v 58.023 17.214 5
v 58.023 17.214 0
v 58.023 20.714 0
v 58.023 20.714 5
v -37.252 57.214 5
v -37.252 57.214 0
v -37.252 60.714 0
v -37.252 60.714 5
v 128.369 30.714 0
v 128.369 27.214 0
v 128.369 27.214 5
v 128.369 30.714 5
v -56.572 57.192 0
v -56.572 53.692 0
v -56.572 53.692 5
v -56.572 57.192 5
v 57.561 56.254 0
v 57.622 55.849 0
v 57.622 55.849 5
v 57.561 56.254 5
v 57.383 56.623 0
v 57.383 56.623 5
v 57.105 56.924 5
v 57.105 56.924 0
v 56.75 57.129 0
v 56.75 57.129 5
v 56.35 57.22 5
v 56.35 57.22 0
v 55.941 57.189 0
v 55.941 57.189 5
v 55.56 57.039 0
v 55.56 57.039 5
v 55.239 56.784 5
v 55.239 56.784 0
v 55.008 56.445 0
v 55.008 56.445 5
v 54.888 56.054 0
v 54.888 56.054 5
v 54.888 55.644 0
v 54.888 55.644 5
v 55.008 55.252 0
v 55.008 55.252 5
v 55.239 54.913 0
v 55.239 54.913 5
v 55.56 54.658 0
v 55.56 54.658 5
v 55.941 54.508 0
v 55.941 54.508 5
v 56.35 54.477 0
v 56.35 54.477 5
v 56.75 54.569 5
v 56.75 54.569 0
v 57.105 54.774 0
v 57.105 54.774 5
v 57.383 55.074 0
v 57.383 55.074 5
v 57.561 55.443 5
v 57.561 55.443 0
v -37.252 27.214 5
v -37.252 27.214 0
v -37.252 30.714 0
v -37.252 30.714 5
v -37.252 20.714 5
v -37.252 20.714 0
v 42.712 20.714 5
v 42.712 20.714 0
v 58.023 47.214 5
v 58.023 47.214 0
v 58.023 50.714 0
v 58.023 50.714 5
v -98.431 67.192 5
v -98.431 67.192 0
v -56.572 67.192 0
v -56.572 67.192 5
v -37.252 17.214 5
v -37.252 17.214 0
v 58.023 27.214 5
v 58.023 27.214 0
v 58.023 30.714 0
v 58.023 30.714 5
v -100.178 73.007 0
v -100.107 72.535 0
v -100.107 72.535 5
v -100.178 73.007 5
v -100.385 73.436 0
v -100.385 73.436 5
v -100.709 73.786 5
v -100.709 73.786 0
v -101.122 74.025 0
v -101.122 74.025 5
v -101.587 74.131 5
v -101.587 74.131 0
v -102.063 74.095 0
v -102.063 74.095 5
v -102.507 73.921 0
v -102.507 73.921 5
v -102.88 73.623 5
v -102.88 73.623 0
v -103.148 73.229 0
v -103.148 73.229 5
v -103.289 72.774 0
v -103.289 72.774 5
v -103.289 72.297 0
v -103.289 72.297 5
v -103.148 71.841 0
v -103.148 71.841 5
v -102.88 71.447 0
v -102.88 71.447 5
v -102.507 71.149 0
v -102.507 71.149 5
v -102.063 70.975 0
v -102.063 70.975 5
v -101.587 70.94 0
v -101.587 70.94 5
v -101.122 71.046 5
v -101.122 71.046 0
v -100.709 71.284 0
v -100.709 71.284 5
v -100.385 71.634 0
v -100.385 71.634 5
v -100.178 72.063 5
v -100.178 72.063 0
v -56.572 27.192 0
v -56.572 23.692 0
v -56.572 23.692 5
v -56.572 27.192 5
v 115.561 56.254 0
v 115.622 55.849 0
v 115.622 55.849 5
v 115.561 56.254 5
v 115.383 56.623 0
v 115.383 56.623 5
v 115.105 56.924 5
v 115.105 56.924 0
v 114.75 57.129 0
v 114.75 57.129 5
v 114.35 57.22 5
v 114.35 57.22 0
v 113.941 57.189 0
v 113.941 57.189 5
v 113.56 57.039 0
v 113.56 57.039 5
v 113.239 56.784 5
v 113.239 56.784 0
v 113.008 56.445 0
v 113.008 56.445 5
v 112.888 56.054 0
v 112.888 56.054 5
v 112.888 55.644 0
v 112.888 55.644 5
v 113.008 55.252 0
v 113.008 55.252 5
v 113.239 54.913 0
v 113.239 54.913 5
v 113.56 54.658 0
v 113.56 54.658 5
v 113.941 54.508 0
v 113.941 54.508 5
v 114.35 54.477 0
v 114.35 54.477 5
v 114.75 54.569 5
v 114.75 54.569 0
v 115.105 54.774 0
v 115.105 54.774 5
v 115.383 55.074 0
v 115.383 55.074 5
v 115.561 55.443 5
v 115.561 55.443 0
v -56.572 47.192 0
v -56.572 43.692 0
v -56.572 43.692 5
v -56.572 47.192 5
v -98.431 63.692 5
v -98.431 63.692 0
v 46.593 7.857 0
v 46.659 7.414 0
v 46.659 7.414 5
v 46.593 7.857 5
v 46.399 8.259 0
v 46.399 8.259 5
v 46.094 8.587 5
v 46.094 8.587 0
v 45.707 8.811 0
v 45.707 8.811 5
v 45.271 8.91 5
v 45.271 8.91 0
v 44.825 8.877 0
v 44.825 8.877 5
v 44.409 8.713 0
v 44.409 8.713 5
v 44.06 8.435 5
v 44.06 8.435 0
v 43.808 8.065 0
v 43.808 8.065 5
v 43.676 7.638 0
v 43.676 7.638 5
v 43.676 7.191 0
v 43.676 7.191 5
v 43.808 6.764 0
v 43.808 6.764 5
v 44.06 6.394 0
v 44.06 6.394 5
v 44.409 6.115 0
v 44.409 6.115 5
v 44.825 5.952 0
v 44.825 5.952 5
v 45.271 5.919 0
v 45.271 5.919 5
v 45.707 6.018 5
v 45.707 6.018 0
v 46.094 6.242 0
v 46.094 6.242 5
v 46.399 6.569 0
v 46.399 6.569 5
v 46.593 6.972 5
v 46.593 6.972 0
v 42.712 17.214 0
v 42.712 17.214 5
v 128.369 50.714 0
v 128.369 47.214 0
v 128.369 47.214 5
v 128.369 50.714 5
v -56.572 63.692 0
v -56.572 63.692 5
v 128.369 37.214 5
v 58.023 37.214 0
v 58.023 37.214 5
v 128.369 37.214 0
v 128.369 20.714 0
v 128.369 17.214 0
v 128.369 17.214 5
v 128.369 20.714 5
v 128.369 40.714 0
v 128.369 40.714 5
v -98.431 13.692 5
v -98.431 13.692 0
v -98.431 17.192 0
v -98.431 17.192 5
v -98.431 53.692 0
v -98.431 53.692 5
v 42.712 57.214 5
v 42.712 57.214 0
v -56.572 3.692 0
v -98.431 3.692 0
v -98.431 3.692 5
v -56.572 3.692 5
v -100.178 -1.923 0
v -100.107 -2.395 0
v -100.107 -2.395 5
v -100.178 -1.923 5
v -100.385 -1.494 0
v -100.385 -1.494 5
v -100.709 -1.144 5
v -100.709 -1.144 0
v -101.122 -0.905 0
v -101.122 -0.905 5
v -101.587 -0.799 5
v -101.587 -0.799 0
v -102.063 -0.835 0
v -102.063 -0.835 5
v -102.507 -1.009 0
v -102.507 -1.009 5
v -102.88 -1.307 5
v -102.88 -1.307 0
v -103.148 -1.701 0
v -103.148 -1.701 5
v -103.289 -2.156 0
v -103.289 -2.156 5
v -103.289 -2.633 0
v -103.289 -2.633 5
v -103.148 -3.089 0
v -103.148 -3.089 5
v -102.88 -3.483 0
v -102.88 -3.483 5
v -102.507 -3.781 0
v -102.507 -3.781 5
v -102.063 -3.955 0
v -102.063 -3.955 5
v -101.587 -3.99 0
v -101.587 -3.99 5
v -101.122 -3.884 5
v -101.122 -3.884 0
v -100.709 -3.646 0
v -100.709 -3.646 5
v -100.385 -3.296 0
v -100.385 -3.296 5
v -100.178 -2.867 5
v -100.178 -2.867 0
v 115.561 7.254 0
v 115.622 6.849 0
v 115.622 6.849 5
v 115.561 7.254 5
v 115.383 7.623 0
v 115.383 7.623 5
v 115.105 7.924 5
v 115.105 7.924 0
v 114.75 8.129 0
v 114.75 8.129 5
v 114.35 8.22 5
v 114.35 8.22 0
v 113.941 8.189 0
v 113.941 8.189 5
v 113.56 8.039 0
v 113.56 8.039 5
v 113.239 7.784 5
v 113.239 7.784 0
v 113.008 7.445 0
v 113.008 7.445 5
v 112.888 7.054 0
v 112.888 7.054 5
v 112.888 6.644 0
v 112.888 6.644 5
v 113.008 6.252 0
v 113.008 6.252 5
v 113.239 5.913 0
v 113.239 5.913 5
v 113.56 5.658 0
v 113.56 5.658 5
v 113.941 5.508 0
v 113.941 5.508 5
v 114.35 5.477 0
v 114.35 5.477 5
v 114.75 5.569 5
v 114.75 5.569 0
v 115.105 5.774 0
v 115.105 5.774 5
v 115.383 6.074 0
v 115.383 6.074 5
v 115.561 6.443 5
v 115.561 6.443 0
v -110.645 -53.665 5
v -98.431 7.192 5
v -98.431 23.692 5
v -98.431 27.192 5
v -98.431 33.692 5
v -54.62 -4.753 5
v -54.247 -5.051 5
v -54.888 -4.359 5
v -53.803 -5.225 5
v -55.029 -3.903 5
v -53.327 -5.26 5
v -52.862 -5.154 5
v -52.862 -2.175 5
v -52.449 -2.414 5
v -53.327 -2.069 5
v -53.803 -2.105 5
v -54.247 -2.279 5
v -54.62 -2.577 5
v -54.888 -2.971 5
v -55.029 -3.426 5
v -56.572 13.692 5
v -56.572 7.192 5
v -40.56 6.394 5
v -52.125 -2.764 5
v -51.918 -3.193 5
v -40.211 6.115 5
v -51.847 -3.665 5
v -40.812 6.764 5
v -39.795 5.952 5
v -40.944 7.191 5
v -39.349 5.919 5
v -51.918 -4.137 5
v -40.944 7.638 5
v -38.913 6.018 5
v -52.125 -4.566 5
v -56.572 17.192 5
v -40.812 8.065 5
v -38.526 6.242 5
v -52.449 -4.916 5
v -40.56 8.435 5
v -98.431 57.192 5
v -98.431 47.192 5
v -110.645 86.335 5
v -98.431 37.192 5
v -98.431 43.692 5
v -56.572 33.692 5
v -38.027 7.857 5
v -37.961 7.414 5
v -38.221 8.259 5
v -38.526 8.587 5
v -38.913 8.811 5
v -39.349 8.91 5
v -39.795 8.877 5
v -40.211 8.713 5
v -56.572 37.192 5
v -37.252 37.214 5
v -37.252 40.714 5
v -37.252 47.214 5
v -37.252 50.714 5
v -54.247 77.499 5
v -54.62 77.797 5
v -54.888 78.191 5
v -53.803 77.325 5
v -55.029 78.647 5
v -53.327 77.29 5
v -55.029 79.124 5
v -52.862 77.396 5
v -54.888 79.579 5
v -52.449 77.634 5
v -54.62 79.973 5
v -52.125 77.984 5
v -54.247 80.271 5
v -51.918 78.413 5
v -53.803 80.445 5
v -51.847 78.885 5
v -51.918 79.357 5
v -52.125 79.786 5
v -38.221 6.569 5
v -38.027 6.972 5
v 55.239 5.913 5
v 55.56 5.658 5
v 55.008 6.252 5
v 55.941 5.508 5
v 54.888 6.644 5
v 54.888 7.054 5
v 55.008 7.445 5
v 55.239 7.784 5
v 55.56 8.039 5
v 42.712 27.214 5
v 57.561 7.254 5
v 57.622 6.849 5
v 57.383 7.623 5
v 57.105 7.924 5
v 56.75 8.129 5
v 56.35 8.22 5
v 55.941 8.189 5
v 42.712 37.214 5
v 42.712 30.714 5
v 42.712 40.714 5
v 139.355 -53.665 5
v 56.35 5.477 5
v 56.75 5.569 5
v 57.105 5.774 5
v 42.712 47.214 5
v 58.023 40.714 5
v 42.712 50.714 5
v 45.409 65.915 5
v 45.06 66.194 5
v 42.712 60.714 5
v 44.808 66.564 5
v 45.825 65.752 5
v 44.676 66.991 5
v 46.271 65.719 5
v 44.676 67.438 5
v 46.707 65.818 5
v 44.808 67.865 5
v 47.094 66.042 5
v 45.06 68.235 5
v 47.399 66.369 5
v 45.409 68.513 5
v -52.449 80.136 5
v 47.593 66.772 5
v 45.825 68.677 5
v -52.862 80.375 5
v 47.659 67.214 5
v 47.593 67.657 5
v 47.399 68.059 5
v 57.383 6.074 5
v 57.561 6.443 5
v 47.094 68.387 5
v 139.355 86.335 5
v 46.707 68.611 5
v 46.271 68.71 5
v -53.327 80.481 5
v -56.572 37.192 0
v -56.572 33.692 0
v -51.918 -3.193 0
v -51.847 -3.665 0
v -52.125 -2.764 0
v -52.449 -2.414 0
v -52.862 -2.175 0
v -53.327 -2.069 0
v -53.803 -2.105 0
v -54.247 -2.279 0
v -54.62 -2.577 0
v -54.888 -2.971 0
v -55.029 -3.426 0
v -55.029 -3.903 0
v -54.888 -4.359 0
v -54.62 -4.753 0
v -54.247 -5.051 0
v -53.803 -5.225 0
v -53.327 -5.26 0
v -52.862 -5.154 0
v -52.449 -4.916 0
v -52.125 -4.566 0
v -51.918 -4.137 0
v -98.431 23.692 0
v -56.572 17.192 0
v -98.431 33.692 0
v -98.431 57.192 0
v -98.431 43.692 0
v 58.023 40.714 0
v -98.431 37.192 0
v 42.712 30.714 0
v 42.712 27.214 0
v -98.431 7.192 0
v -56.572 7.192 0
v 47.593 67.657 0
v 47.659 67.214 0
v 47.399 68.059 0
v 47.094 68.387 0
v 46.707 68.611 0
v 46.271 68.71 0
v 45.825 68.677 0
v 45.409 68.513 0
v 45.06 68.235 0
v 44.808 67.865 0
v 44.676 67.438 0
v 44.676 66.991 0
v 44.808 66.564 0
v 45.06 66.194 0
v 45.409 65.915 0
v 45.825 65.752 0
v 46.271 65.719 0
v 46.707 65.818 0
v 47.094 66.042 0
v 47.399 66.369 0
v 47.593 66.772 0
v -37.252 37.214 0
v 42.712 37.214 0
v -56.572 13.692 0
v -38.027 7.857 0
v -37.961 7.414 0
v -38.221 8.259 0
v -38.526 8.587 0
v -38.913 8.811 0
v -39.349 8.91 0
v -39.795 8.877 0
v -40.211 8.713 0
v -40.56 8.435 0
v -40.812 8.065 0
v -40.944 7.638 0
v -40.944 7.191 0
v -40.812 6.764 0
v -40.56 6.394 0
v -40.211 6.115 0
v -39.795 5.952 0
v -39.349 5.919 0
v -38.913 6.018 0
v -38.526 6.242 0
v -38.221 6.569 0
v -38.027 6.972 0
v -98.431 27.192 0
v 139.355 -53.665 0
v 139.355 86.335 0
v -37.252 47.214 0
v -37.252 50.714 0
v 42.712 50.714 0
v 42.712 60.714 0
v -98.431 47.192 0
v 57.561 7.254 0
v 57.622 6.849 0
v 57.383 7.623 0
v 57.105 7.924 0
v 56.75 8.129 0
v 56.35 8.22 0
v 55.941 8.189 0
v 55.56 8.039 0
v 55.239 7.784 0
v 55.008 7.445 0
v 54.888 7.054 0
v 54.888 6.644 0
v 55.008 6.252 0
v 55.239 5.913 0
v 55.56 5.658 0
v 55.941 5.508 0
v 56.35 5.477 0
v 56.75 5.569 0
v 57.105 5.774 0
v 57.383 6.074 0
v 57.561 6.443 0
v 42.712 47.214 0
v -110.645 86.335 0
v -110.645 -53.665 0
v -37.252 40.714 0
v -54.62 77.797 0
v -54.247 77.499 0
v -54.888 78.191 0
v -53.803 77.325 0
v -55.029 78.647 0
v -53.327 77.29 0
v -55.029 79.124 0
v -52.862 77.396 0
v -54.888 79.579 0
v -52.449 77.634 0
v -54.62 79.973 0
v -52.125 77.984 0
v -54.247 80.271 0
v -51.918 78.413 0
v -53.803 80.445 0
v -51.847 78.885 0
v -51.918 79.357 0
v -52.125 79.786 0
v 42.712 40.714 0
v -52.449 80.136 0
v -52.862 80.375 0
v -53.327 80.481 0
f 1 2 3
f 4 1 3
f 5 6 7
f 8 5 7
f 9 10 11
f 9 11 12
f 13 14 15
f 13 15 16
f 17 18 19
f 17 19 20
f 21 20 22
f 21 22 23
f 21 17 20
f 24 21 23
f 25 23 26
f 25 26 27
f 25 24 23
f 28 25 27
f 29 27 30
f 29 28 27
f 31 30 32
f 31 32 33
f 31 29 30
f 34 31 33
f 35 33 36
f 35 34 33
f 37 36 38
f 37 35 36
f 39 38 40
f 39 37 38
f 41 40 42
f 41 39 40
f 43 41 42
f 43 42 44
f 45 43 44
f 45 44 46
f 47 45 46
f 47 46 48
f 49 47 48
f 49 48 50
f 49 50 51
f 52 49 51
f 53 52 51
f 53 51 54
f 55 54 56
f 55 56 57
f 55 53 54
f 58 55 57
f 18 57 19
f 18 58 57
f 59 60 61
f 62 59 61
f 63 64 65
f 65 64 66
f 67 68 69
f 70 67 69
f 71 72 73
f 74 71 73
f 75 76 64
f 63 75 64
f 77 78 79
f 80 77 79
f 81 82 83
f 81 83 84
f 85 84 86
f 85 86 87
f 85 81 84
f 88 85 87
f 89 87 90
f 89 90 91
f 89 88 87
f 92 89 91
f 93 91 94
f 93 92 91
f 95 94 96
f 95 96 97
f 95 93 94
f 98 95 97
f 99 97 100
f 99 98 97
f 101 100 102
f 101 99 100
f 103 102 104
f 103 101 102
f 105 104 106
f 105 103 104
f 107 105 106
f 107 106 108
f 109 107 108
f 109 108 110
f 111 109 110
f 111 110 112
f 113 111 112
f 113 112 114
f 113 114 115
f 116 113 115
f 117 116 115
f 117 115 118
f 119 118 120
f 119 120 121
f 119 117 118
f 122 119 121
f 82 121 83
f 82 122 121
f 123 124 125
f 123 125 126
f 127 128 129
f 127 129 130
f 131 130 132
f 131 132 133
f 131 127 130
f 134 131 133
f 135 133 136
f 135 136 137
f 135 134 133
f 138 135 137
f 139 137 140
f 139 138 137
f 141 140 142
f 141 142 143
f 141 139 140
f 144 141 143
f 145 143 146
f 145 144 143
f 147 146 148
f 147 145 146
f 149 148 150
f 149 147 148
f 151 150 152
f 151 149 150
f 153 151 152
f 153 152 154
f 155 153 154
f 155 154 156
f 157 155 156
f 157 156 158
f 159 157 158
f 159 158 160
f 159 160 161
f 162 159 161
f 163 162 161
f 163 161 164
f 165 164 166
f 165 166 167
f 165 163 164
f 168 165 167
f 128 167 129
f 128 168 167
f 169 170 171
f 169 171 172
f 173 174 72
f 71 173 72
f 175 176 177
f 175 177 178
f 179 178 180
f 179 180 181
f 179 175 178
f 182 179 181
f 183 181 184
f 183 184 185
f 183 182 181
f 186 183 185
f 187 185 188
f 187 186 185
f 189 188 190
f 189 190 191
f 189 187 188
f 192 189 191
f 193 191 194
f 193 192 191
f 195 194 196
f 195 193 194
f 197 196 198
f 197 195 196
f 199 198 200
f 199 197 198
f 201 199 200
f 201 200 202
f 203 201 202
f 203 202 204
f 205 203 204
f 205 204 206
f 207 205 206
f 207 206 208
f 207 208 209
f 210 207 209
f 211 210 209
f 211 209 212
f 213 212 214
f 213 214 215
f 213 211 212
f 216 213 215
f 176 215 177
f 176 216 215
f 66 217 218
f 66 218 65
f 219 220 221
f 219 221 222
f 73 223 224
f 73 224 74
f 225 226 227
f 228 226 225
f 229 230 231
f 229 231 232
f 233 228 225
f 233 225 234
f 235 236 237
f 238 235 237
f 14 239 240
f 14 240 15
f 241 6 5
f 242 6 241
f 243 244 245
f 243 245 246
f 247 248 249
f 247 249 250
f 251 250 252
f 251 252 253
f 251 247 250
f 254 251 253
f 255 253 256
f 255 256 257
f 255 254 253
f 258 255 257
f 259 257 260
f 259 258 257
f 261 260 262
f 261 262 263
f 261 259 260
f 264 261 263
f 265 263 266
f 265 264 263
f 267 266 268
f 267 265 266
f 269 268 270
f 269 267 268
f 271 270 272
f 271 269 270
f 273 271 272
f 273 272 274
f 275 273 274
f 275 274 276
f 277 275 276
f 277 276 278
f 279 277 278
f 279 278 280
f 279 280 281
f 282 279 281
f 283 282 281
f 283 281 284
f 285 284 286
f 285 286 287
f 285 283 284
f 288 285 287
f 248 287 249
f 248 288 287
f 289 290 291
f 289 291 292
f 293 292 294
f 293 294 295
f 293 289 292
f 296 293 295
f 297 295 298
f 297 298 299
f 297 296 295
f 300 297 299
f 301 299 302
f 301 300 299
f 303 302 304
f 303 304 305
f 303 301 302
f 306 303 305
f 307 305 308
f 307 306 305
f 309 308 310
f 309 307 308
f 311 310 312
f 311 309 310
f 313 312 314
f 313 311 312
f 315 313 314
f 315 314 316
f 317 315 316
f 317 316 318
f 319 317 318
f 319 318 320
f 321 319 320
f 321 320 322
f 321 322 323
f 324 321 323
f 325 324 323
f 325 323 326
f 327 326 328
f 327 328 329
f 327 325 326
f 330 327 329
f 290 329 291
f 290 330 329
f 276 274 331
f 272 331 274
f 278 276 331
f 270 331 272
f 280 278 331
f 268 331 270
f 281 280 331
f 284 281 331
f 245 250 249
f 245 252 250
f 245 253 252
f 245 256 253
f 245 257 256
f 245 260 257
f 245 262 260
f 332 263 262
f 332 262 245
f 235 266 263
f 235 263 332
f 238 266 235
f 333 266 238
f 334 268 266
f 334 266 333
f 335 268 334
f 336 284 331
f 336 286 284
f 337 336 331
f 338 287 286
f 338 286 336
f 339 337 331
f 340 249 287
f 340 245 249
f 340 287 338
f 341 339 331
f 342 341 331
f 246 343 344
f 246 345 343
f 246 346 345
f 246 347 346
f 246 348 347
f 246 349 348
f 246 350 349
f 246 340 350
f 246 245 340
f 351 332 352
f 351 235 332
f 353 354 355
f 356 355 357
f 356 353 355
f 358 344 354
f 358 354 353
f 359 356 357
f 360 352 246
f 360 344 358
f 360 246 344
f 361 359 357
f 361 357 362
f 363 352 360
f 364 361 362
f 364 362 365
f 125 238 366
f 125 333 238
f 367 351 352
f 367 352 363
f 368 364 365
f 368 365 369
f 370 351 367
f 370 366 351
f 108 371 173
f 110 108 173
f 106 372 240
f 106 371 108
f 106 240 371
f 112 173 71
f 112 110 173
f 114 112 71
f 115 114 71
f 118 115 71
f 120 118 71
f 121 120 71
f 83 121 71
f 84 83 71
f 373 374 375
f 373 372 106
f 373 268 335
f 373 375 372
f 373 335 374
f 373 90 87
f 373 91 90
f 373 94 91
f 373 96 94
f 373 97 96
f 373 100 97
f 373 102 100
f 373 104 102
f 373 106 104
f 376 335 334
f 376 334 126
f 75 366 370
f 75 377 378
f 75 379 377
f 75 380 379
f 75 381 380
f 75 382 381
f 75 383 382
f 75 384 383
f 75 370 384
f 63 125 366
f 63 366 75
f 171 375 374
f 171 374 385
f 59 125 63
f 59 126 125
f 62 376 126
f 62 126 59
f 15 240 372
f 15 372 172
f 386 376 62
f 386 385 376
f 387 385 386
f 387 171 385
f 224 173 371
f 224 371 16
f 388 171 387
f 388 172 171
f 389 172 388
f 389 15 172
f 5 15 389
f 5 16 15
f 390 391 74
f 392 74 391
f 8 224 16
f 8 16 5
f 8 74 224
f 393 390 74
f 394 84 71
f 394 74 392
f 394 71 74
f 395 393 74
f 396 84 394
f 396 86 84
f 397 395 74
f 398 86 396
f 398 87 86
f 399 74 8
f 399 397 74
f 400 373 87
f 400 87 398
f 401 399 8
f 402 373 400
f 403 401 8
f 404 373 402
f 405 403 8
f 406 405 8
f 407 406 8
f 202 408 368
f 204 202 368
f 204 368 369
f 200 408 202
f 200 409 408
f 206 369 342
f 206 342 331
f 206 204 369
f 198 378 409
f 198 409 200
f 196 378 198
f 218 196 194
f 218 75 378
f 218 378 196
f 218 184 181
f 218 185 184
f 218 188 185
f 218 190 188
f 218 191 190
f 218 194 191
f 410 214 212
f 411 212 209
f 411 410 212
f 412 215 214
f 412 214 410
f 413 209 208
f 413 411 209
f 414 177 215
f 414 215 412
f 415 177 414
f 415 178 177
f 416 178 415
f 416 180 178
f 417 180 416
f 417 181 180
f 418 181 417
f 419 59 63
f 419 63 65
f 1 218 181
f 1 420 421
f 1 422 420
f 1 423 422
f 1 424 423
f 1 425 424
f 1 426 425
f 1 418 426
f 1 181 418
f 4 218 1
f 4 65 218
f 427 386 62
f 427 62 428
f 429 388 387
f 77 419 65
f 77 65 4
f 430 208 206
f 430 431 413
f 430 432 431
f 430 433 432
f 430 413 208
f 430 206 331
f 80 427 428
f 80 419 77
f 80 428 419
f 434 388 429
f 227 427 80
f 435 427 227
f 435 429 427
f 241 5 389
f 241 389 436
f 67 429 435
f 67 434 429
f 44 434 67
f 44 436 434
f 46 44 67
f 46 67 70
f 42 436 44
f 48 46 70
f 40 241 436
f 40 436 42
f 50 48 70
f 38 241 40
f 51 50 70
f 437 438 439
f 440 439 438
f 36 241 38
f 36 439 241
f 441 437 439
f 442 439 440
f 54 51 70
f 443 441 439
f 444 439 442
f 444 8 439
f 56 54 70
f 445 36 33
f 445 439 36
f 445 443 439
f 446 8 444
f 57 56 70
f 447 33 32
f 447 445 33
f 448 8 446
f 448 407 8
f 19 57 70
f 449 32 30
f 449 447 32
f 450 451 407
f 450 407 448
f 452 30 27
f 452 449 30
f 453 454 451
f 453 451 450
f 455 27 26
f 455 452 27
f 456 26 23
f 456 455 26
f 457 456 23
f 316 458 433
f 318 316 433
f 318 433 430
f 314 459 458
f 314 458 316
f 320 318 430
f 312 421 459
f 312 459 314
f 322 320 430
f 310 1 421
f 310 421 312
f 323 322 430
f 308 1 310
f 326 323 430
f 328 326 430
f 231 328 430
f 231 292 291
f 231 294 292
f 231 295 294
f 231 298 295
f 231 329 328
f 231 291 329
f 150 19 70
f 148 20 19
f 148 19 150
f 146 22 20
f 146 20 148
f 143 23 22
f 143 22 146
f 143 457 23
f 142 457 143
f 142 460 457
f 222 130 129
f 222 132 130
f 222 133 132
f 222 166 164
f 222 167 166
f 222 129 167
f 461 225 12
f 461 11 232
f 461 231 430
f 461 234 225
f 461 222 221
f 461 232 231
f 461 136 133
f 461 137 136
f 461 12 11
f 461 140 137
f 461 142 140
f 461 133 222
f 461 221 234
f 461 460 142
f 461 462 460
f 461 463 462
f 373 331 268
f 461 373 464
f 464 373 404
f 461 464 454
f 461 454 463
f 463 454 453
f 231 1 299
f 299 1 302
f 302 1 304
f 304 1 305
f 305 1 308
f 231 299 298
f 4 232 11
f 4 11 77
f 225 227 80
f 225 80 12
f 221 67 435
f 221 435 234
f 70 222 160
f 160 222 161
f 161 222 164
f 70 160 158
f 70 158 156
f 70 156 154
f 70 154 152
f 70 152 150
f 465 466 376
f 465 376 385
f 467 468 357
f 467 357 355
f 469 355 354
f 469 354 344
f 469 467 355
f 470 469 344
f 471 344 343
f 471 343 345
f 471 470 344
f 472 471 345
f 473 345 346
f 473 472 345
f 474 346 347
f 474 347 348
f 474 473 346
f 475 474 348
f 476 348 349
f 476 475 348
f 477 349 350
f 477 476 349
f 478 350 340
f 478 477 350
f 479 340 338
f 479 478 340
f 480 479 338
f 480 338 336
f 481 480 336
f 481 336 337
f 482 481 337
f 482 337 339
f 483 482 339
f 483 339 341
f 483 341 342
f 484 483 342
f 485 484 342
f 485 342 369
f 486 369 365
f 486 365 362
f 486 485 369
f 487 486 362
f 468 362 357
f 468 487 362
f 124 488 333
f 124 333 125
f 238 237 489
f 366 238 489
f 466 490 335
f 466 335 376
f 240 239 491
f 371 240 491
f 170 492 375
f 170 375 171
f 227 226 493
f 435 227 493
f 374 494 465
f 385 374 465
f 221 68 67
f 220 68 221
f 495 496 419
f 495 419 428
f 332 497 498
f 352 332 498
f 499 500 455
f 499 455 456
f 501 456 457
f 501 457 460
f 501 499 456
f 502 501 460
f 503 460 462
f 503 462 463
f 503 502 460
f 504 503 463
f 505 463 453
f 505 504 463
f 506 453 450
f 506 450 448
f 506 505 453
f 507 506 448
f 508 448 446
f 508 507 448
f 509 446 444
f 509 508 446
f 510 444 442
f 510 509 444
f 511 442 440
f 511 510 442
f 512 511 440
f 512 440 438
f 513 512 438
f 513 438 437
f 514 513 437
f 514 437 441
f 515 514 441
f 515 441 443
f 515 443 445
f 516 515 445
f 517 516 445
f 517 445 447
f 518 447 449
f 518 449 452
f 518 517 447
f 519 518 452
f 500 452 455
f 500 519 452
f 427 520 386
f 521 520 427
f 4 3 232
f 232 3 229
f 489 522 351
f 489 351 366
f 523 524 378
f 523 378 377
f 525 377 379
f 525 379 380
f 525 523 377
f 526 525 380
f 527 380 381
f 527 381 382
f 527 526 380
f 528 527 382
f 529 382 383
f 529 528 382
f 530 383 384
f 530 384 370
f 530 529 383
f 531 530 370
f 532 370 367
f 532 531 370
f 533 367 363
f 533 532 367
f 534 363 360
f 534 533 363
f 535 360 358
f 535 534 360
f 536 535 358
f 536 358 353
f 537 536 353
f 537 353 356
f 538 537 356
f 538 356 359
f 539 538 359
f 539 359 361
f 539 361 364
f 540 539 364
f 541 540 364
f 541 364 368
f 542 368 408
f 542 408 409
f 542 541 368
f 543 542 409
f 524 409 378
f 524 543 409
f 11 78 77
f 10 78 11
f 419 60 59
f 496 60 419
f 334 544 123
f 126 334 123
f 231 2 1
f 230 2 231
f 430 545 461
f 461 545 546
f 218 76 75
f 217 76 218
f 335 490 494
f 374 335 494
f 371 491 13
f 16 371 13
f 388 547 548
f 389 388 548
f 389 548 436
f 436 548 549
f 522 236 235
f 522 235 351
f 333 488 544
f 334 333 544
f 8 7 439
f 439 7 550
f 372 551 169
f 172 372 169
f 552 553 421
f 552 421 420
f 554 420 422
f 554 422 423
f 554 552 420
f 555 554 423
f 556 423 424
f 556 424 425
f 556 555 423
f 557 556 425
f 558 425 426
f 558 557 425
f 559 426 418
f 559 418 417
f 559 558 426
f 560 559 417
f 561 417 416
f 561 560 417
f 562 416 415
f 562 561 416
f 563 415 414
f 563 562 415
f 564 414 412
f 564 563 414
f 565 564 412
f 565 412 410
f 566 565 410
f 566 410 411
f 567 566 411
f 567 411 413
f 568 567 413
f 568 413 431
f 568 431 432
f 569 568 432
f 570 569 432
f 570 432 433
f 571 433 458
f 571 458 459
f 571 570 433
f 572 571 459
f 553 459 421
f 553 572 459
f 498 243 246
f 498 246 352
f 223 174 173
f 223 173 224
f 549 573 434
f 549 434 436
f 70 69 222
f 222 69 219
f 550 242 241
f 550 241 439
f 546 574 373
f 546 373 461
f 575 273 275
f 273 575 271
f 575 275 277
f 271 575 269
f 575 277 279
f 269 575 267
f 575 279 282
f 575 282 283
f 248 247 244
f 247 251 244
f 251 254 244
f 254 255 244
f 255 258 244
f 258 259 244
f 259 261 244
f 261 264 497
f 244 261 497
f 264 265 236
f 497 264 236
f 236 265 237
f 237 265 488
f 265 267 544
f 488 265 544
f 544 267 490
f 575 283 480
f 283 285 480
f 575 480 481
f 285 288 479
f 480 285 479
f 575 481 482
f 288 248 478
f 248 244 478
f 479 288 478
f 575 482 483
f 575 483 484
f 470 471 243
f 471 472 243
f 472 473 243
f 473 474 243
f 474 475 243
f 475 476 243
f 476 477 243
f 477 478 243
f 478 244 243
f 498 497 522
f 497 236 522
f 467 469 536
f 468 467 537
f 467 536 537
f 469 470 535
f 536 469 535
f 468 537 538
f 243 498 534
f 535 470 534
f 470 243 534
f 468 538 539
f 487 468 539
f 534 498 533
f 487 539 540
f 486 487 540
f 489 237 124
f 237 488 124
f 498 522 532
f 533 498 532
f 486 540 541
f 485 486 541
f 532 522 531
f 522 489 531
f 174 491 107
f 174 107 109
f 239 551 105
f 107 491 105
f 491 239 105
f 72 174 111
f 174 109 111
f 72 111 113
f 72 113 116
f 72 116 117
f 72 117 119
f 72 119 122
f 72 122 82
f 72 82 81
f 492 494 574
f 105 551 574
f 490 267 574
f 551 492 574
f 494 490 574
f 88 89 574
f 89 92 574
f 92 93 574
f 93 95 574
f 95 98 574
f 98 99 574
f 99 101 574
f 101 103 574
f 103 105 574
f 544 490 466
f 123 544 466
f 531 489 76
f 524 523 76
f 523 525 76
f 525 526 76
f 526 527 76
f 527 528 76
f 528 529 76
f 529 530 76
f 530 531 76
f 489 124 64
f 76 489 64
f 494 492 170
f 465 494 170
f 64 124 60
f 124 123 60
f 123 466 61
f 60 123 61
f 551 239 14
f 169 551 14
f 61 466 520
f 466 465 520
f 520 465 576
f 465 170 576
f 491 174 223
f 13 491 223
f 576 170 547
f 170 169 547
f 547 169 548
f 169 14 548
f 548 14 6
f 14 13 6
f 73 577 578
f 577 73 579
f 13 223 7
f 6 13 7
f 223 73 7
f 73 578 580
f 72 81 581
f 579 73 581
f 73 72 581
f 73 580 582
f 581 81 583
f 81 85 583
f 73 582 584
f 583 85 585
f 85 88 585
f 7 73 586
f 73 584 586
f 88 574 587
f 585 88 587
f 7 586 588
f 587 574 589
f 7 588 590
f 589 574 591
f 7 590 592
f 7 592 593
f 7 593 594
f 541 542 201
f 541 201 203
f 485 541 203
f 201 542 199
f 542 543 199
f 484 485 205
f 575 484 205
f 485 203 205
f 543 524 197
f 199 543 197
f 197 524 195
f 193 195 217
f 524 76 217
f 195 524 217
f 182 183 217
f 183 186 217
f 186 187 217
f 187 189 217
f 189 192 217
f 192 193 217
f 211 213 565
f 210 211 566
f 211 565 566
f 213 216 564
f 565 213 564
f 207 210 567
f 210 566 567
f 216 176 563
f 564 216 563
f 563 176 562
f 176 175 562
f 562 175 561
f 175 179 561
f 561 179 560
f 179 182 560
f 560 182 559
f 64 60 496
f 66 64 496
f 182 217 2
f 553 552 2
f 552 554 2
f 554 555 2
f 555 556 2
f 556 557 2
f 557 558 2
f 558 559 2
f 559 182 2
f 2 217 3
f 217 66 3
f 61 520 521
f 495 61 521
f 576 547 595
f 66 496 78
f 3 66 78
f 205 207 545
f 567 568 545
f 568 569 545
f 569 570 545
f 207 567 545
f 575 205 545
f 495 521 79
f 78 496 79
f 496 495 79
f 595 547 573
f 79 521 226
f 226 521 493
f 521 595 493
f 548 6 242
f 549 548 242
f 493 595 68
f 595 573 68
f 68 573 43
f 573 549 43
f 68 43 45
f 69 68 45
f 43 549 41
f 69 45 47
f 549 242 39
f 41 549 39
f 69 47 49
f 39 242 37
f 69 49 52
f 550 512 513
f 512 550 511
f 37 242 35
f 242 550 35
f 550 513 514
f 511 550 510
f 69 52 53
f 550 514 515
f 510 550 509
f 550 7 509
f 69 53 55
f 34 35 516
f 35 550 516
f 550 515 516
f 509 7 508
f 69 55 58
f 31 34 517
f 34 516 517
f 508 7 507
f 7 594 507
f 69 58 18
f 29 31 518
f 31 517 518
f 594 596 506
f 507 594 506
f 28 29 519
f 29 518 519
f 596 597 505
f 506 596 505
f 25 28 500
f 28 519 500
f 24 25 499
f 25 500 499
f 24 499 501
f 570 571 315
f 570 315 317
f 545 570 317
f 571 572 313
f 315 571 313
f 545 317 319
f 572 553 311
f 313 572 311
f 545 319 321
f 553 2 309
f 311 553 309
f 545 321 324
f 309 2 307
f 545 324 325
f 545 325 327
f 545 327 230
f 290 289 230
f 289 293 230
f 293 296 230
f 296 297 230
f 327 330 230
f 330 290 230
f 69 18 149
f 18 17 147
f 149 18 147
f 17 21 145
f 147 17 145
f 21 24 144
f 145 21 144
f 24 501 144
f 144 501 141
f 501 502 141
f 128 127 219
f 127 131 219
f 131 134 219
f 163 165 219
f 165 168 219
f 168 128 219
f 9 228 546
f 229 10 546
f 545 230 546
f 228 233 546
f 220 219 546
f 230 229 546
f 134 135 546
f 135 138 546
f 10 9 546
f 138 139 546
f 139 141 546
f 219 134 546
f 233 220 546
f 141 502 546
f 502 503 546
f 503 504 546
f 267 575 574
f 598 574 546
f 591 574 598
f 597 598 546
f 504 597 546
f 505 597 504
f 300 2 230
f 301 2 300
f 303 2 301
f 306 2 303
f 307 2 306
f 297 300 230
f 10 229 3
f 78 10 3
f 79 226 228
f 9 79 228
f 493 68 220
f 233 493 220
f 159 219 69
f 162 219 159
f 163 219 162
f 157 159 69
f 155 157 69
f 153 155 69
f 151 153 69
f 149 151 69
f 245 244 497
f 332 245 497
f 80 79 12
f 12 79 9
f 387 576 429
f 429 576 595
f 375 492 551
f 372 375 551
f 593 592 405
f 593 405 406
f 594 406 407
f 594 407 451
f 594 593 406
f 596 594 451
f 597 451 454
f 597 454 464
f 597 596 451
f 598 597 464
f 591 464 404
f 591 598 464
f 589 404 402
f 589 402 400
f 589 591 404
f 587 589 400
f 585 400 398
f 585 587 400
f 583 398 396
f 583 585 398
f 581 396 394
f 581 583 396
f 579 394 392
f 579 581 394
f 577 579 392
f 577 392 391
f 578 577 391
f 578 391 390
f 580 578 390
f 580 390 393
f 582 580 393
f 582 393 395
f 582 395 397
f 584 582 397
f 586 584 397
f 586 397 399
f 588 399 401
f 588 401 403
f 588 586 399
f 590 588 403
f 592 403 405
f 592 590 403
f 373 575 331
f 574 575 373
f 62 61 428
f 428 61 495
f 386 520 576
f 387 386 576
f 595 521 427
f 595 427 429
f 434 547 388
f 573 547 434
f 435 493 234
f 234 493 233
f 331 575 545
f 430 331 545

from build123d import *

# Parameters (mm, degrees)
CROQUIS1_W              = 250
CROQUIS1_H              = 140
CROQUIS1_R              = 1.6
CROQUIS1_R_2            = 1.375
CROQUIS1_R_3            = 1.5
CROQUIS1_W_2            = 41.859919993
CROQUIS1_H_2            = 3.5
CROQUIS1_W_3            = 79.963180499
CROQUIS1_W_4            = 70.346682928
SALIENTE_EXTRUIR1_DEPTH = 5


with BuildPart() as part:
    # Croquis1 → Saliente-Extruir1 (new body)
    with BuildSketch(Plane.XY):
        with Locations((14.354712009, 16.335108086)):
            Rectangle(CROQUIS1_W, CROQUIS1_H)
        with Locations((-101.706636686, -2.394891914)):
            Circle(CROQUIS1_R, mode=Mode.SUBTRACT)
        with Locations((-53.446636686, -3.664891914)):
            Circle(CROQUIS1_R, mode=Mode.SUBTRACT)
        with Locations((114.247224856, 6.848582104)):
            Circle(CROQUIS1_R_2, mode=Mode.SUBTRACT)
        with Locations((114.247224856, 55.848582104)):
            Circle(CROQUIS1_R_2, mode=Mode.SUBTRACT)
        with Locations((56.247224856, 6.848582104)):
            Circle(CROQUIS1_R_2, mode=Mode.SUBTRACT)
        with Locations((56.247224856, 55.848582104)):
            Circle(CROQUIS1_R_2, mode=Mode.SUBTRACT)
        with Locations((46.159209602, 67.214416737)):
            Circle(CROQUIS1_R_3, mode=Mode.SUBTRACT)
        with Locations((45.159209602, 7.414416737)):
            Circle(CROQUIS1_R_3, mode=Mode.SUBTRACT)
        with Locations((-39.460790398, 7.414416737)):
            Circle(CROQUIS1_R_3, mode=Mode.SUBTRACT)
        with Locations((-101.706636686, 72.535108086)):
            Circle(CROQUIS1_R, mode=Mode.SUBTRACT)
        with Locations((-53.446636686, 78.885108086)):
            Circle(CROQUIS1_R, mode=Mode.SUBTRACT)
        with Locations((-77.501473664, 55.441697687)):
            Rectangle(CROQUIS1_W_2, CROQUIS1_H_2, mode=Mode.SUBTRACT)
        with Locations((-77.501473664, 65.441697687)):
            Rectangle(CROQUIS1_W_2, CROQUIS1_H_2, mode=Mode.SUBTRACT)
        with Locations((-77.501473664, 45.441697687)):
            Rectangle(CROQUIS1_W_2, CROQUIS1_H_2, mode=Mode.SUBTRACT)
        with Locations((-77.501473664, 35.441697687)):
            Rectangle(CROQUIS1_W_2, CROQUIS1_H_2, mode=Mode.SUBTRACT)
        with Locations((-77.501473664, 25.441697687)):
            Rectangle(CROQUIS1_W_2, CROQUIS1_H_2, mode=Mode.SUBTRACT)
        with Locations((-77.501473664, 15.441697687)):
            Rectangle(CROQUIS1_W_2, CROQUIS1_H_2, mode=Mode.SUBTRACT)
        with Locations((-77.501473664, 5.441697687)):
            Rectangle(CROQUIS1_W_2, CROQUIS1_H_2, mode=Mode.SUBTRACT)
        with Locations((2.730039656, 48.964416737)):
            Rectangle(CROQUIS1_W_3, CROQUIS1_H_2, mode=Mode.SUBTRACT)
        with Locations((2.730039656, 58.964416737)):
            Rectangle(CROQUIS1_W_3, CROQUIS1_H_2, mode=Mode.SUBTRACT)
        with Locations((2.730039656, 38.964416737)):
            Rectangle(CROQUIS1_W_3, CROQUIS1_H_2, mode=Mode.SUBTRACT)
        with Locations((2.730039656, 28.964416737)):
            Rectangle(CROQUIS1_W_3, CROQUIS1_H_2, mode=Mode.SUBTRACT)
        with Locations((2.730039656, 18.964416737)):
            Rectangle(CROQUIS1_W_3, CROQUIS1_H_2, mode=Mode.SUBTRACT)
        with Locations((93.196116464, 38.964416737)):
            Rectangle(CROQUIS1_W_4, CROQUIS1_H_2, mode=Mode.SUBTRACT)
        with Locations((93.196116464, 48.964416737)):
            Rectangle(CROQUIS1_W_4, CROQUIS1_H_2, mode=Mode.SUBTRACT)
        with Locations((93.196116464, 28.964416737)):
            Rectangle(CROQUIS1_W_4, CROQUIS1_H_2, mode=Mode.SUBTRACT)
        with Locations((93.196116464, 18.964416737)):
            Rectangle(CROQUIS1_W_4, CROQUIS1_H_2, mode=Mode.SUBTRACT)
    extrude(amount=SALIENTE_EXTRUIR1_DEPTH)


solid = part.part
